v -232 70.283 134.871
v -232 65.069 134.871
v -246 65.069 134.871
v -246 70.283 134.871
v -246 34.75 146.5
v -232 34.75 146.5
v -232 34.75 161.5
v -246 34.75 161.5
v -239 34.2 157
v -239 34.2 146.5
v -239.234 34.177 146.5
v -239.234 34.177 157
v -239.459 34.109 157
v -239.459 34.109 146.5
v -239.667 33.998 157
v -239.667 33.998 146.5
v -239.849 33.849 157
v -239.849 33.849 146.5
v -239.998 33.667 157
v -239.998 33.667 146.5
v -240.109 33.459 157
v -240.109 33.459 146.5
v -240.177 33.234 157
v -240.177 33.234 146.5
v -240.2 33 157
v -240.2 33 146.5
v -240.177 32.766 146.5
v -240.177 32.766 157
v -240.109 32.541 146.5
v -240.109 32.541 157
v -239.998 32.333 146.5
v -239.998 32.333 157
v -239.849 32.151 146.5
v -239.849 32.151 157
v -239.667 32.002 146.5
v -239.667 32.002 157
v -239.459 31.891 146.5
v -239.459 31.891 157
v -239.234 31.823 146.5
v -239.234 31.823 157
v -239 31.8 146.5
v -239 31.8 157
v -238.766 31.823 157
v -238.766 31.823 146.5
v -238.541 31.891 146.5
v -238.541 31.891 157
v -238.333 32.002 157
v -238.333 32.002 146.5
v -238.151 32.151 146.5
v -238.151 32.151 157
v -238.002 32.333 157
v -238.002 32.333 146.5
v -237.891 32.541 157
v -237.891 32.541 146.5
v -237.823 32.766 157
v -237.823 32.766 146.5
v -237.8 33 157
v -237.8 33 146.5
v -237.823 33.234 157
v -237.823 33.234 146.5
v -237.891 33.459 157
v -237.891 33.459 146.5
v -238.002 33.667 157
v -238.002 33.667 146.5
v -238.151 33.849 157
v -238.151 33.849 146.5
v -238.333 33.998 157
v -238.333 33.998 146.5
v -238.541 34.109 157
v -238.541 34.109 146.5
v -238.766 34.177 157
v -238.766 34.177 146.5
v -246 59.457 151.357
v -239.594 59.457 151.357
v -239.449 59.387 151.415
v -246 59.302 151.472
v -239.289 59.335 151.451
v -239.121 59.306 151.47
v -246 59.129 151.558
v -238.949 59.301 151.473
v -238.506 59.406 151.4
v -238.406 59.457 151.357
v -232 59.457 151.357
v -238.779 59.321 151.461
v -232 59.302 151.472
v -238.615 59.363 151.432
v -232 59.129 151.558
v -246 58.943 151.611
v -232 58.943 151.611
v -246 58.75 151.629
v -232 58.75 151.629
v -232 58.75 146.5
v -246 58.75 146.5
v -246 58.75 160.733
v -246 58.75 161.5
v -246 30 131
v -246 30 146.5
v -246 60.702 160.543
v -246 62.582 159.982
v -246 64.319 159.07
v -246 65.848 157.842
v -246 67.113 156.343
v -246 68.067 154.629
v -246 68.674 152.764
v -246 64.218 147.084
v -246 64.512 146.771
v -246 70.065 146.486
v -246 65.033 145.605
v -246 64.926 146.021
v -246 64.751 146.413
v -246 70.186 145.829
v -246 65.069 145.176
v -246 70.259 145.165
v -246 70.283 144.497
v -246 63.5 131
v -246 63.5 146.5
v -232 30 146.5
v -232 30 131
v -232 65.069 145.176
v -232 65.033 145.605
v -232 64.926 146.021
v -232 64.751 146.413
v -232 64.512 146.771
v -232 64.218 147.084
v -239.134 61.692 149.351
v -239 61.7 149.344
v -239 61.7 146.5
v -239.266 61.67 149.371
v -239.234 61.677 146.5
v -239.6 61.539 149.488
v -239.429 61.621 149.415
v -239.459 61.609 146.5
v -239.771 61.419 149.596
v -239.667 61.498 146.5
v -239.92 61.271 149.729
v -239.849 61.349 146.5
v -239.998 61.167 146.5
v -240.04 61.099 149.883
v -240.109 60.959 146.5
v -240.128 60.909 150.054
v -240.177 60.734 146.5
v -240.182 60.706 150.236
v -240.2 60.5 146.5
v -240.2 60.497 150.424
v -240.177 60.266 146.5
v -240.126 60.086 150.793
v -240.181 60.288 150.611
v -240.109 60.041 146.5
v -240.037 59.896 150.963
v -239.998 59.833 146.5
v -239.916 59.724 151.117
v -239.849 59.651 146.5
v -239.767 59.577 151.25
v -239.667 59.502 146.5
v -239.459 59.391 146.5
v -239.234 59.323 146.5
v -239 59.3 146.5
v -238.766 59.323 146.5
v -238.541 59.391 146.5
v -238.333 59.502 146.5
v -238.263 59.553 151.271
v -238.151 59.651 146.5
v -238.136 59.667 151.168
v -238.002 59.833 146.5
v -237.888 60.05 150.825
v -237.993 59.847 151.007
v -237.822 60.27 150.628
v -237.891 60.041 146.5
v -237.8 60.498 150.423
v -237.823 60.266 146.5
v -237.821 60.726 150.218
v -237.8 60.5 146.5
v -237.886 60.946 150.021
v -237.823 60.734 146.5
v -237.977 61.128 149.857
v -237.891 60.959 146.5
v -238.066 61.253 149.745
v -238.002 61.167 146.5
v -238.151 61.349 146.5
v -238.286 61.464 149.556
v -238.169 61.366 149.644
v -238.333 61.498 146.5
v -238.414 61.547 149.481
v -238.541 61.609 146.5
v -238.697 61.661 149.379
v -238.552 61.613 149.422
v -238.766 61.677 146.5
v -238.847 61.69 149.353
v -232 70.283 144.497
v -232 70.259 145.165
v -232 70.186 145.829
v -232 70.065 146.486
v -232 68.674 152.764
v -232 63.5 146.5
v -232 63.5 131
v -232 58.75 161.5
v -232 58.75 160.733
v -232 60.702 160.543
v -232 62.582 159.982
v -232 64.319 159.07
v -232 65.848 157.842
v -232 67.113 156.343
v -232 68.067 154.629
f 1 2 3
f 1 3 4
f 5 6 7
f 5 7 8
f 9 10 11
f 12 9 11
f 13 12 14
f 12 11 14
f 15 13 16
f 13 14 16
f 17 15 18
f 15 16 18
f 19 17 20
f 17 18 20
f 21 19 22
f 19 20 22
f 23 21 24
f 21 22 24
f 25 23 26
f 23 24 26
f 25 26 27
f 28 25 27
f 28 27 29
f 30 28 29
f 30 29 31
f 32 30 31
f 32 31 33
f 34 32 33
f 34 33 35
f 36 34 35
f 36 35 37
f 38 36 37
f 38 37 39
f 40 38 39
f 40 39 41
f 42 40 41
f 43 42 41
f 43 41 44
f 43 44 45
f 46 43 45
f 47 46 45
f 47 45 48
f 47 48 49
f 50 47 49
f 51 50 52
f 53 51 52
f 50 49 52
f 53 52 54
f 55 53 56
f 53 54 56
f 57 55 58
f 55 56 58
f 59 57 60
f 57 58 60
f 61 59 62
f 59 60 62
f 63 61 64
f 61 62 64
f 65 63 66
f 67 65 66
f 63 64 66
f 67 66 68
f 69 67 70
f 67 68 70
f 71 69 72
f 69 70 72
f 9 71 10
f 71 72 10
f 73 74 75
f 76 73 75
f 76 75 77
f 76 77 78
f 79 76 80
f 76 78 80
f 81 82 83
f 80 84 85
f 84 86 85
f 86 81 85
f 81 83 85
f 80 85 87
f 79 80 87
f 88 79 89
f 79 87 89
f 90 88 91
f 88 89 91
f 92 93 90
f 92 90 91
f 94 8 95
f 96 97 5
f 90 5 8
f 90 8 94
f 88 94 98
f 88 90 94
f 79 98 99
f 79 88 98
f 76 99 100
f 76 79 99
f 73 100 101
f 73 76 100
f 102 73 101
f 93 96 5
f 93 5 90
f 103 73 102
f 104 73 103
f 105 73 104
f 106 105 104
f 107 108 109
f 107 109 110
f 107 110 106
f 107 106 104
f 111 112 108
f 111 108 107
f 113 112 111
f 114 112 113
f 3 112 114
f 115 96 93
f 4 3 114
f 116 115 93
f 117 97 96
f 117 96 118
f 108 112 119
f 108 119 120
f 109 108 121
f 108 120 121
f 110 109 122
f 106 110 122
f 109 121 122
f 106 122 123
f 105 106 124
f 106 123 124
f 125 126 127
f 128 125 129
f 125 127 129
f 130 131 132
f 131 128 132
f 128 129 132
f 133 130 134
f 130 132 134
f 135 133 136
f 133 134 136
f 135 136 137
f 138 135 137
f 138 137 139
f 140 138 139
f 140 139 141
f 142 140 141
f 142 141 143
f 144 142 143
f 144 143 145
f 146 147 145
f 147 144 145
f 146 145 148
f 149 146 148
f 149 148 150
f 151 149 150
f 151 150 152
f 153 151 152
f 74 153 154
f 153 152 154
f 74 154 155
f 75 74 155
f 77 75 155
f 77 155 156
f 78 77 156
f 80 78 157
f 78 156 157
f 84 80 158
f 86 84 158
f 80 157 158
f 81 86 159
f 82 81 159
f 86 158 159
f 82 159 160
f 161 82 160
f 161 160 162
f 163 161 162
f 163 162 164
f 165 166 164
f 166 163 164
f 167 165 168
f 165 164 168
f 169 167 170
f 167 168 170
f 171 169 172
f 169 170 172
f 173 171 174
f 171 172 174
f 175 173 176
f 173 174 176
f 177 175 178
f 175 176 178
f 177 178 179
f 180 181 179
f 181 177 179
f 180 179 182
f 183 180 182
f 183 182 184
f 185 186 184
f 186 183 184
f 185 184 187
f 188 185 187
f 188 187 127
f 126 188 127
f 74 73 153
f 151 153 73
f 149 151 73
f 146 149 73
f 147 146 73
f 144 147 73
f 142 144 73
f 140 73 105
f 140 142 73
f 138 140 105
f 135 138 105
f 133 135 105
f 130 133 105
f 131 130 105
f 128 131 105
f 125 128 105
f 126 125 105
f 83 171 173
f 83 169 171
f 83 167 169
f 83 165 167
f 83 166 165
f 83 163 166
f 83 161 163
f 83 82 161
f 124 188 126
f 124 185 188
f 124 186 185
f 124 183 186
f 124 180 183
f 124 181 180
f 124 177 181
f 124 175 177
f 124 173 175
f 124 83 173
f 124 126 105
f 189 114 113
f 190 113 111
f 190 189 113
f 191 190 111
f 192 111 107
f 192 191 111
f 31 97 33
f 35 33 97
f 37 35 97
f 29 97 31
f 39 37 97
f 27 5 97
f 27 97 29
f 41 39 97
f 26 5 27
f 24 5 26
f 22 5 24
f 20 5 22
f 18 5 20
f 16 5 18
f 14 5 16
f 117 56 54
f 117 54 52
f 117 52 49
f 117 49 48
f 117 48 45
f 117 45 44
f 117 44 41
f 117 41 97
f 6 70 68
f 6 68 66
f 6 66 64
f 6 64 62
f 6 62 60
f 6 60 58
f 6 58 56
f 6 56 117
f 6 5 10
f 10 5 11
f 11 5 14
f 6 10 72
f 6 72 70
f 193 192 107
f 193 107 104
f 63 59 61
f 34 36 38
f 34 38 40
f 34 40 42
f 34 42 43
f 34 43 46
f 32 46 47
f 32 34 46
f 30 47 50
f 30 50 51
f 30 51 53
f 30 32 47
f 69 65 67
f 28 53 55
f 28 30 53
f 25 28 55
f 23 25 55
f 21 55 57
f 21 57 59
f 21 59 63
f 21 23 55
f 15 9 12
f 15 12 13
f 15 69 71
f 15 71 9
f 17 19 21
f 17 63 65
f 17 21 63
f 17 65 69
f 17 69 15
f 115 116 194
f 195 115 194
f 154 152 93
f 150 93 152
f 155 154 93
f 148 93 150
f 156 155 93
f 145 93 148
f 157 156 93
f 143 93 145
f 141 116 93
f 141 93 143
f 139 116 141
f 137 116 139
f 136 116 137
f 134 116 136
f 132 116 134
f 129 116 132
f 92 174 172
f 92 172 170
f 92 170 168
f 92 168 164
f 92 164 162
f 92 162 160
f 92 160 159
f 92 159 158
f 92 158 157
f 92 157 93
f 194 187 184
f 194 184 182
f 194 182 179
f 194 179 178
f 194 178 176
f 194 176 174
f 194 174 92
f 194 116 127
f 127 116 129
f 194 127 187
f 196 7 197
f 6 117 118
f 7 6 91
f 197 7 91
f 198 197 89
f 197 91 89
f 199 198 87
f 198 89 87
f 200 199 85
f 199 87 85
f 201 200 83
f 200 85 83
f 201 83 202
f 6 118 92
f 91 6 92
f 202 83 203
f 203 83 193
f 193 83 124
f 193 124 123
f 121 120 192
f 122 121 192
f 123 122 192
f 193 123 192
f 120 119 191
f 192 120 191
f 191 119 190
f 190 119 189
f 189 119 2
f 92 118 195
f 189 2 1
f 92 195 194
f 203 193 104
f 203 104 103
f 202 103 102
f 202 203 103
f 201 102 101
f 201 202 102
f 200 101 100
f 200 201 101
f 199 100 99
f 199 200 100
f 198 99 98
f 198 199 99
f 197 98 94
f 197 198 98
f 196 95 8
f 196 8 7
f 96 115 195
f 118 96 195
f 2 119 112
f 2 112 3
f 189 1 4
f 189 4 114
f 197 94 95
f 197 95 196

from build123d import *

# Parameters (mm, degrees)
PAD015_DEPTH = 14
SKETCH019_R  = 1.2
SKETCH019_W  = 24
SKETCH019_H  = 13
PAD014_DEPTH = 16
BOX068_W     = 14
BOX068_H     = 24
BOX068_DEPTH = 29.5
BOX067_W     = 14
BOX067_H     = 33.5
BOX067_DEPTH = 15.5


with BuildPart() as pad015:
    # Sketch020 → Pad015 (new body)
    with BuildSketch(Plane.YZ.offset(-232)):
        with BuildLine():
            Line((58.746344, 151.629037), (56.780618, 151.629037))
            Line((56.780618, 151.629037), (56.780618, 160.732927))
            Line((56.780618, 160.732927), (58.746348, 160.732927))
            ThreePointArc((68.674081, 152.764142), (65.111515, 158.494314), (58.746348, 160.732927))
            Line((70.065189, 146.485826), (68.674081, 152.764142))
            ThreePointArc((70.282905, 144.496813), (70.228314, 145.49726), (70.065189, 146.485826))
            Line((70.282905, 134.870576), (70.282905, 144.496813))
            Line((65.069016, 134.870576), (70.282905, 134.870576))
            Line((65.069016, 145.176214), (65.069016, 134.870576))
            ThreePointArc((65.069016, 145.176214), (64.846538, 146.220855), (64.217716, 147.084195))
            Line((59.457466, 151.35671), (64.217716, 147.084195))
            ThreePointArc((59.457466, 151.35671), (59.127086, 151.558628), (58.746344, 151.629037))
        make_face()
    extrude(amount=-PAD015_DEPTH)


with BuildPart() as pad014:
    # Sketch019 → Pad014 (new body)
    with BuildSketch(Plane(origin=(-119, 23.5, 141), x_dir=(0, 1, 0), z_dir=(0, 0, 1))):
        with Locations((37, 120)):
            Circle(SKETCH019_R)
        with Locations((9.5, 120)):
            Circle(SKETCH019_R)
        with Locations((23.25, 120)):
            Rectangle(SKETCH019_W, SKETCH019_H)
    extrude(amount=PAD014_DEPTH)


with BuildPart() as cubo014:
    # Box068 → Box068 (new body)
    with BuildSketch(Plane(origin=(-246, 34.75, 132), x_dir=(1, 0, 0), z_dir=(0, 0, 1))):
        with Locations((7, 12)):
            Rectangle(BOX068_W, BOX068_H)
    extrude(amount=BOX068_DEPTH)


with BuildPart() as head_positive_cut:
    # Box067 → Box067 (new body)
    with BuildSketch(Plane(origin=(-246, 30, 131), x_dir=(1, 0, 0), z_dir=(0, 0, 1))):
        with Locations((7, 16.75)):
            Rectangle(BOX067_W, BOX067_H)
    extrude(amount=BOX067_DEPTH)

    # Fusion065: union Pad015, Pad014, Cubo014
    add(pad015.part)
    add(pad014.part)
    add(cubo014.part)


solid = head_positive_cut.part
